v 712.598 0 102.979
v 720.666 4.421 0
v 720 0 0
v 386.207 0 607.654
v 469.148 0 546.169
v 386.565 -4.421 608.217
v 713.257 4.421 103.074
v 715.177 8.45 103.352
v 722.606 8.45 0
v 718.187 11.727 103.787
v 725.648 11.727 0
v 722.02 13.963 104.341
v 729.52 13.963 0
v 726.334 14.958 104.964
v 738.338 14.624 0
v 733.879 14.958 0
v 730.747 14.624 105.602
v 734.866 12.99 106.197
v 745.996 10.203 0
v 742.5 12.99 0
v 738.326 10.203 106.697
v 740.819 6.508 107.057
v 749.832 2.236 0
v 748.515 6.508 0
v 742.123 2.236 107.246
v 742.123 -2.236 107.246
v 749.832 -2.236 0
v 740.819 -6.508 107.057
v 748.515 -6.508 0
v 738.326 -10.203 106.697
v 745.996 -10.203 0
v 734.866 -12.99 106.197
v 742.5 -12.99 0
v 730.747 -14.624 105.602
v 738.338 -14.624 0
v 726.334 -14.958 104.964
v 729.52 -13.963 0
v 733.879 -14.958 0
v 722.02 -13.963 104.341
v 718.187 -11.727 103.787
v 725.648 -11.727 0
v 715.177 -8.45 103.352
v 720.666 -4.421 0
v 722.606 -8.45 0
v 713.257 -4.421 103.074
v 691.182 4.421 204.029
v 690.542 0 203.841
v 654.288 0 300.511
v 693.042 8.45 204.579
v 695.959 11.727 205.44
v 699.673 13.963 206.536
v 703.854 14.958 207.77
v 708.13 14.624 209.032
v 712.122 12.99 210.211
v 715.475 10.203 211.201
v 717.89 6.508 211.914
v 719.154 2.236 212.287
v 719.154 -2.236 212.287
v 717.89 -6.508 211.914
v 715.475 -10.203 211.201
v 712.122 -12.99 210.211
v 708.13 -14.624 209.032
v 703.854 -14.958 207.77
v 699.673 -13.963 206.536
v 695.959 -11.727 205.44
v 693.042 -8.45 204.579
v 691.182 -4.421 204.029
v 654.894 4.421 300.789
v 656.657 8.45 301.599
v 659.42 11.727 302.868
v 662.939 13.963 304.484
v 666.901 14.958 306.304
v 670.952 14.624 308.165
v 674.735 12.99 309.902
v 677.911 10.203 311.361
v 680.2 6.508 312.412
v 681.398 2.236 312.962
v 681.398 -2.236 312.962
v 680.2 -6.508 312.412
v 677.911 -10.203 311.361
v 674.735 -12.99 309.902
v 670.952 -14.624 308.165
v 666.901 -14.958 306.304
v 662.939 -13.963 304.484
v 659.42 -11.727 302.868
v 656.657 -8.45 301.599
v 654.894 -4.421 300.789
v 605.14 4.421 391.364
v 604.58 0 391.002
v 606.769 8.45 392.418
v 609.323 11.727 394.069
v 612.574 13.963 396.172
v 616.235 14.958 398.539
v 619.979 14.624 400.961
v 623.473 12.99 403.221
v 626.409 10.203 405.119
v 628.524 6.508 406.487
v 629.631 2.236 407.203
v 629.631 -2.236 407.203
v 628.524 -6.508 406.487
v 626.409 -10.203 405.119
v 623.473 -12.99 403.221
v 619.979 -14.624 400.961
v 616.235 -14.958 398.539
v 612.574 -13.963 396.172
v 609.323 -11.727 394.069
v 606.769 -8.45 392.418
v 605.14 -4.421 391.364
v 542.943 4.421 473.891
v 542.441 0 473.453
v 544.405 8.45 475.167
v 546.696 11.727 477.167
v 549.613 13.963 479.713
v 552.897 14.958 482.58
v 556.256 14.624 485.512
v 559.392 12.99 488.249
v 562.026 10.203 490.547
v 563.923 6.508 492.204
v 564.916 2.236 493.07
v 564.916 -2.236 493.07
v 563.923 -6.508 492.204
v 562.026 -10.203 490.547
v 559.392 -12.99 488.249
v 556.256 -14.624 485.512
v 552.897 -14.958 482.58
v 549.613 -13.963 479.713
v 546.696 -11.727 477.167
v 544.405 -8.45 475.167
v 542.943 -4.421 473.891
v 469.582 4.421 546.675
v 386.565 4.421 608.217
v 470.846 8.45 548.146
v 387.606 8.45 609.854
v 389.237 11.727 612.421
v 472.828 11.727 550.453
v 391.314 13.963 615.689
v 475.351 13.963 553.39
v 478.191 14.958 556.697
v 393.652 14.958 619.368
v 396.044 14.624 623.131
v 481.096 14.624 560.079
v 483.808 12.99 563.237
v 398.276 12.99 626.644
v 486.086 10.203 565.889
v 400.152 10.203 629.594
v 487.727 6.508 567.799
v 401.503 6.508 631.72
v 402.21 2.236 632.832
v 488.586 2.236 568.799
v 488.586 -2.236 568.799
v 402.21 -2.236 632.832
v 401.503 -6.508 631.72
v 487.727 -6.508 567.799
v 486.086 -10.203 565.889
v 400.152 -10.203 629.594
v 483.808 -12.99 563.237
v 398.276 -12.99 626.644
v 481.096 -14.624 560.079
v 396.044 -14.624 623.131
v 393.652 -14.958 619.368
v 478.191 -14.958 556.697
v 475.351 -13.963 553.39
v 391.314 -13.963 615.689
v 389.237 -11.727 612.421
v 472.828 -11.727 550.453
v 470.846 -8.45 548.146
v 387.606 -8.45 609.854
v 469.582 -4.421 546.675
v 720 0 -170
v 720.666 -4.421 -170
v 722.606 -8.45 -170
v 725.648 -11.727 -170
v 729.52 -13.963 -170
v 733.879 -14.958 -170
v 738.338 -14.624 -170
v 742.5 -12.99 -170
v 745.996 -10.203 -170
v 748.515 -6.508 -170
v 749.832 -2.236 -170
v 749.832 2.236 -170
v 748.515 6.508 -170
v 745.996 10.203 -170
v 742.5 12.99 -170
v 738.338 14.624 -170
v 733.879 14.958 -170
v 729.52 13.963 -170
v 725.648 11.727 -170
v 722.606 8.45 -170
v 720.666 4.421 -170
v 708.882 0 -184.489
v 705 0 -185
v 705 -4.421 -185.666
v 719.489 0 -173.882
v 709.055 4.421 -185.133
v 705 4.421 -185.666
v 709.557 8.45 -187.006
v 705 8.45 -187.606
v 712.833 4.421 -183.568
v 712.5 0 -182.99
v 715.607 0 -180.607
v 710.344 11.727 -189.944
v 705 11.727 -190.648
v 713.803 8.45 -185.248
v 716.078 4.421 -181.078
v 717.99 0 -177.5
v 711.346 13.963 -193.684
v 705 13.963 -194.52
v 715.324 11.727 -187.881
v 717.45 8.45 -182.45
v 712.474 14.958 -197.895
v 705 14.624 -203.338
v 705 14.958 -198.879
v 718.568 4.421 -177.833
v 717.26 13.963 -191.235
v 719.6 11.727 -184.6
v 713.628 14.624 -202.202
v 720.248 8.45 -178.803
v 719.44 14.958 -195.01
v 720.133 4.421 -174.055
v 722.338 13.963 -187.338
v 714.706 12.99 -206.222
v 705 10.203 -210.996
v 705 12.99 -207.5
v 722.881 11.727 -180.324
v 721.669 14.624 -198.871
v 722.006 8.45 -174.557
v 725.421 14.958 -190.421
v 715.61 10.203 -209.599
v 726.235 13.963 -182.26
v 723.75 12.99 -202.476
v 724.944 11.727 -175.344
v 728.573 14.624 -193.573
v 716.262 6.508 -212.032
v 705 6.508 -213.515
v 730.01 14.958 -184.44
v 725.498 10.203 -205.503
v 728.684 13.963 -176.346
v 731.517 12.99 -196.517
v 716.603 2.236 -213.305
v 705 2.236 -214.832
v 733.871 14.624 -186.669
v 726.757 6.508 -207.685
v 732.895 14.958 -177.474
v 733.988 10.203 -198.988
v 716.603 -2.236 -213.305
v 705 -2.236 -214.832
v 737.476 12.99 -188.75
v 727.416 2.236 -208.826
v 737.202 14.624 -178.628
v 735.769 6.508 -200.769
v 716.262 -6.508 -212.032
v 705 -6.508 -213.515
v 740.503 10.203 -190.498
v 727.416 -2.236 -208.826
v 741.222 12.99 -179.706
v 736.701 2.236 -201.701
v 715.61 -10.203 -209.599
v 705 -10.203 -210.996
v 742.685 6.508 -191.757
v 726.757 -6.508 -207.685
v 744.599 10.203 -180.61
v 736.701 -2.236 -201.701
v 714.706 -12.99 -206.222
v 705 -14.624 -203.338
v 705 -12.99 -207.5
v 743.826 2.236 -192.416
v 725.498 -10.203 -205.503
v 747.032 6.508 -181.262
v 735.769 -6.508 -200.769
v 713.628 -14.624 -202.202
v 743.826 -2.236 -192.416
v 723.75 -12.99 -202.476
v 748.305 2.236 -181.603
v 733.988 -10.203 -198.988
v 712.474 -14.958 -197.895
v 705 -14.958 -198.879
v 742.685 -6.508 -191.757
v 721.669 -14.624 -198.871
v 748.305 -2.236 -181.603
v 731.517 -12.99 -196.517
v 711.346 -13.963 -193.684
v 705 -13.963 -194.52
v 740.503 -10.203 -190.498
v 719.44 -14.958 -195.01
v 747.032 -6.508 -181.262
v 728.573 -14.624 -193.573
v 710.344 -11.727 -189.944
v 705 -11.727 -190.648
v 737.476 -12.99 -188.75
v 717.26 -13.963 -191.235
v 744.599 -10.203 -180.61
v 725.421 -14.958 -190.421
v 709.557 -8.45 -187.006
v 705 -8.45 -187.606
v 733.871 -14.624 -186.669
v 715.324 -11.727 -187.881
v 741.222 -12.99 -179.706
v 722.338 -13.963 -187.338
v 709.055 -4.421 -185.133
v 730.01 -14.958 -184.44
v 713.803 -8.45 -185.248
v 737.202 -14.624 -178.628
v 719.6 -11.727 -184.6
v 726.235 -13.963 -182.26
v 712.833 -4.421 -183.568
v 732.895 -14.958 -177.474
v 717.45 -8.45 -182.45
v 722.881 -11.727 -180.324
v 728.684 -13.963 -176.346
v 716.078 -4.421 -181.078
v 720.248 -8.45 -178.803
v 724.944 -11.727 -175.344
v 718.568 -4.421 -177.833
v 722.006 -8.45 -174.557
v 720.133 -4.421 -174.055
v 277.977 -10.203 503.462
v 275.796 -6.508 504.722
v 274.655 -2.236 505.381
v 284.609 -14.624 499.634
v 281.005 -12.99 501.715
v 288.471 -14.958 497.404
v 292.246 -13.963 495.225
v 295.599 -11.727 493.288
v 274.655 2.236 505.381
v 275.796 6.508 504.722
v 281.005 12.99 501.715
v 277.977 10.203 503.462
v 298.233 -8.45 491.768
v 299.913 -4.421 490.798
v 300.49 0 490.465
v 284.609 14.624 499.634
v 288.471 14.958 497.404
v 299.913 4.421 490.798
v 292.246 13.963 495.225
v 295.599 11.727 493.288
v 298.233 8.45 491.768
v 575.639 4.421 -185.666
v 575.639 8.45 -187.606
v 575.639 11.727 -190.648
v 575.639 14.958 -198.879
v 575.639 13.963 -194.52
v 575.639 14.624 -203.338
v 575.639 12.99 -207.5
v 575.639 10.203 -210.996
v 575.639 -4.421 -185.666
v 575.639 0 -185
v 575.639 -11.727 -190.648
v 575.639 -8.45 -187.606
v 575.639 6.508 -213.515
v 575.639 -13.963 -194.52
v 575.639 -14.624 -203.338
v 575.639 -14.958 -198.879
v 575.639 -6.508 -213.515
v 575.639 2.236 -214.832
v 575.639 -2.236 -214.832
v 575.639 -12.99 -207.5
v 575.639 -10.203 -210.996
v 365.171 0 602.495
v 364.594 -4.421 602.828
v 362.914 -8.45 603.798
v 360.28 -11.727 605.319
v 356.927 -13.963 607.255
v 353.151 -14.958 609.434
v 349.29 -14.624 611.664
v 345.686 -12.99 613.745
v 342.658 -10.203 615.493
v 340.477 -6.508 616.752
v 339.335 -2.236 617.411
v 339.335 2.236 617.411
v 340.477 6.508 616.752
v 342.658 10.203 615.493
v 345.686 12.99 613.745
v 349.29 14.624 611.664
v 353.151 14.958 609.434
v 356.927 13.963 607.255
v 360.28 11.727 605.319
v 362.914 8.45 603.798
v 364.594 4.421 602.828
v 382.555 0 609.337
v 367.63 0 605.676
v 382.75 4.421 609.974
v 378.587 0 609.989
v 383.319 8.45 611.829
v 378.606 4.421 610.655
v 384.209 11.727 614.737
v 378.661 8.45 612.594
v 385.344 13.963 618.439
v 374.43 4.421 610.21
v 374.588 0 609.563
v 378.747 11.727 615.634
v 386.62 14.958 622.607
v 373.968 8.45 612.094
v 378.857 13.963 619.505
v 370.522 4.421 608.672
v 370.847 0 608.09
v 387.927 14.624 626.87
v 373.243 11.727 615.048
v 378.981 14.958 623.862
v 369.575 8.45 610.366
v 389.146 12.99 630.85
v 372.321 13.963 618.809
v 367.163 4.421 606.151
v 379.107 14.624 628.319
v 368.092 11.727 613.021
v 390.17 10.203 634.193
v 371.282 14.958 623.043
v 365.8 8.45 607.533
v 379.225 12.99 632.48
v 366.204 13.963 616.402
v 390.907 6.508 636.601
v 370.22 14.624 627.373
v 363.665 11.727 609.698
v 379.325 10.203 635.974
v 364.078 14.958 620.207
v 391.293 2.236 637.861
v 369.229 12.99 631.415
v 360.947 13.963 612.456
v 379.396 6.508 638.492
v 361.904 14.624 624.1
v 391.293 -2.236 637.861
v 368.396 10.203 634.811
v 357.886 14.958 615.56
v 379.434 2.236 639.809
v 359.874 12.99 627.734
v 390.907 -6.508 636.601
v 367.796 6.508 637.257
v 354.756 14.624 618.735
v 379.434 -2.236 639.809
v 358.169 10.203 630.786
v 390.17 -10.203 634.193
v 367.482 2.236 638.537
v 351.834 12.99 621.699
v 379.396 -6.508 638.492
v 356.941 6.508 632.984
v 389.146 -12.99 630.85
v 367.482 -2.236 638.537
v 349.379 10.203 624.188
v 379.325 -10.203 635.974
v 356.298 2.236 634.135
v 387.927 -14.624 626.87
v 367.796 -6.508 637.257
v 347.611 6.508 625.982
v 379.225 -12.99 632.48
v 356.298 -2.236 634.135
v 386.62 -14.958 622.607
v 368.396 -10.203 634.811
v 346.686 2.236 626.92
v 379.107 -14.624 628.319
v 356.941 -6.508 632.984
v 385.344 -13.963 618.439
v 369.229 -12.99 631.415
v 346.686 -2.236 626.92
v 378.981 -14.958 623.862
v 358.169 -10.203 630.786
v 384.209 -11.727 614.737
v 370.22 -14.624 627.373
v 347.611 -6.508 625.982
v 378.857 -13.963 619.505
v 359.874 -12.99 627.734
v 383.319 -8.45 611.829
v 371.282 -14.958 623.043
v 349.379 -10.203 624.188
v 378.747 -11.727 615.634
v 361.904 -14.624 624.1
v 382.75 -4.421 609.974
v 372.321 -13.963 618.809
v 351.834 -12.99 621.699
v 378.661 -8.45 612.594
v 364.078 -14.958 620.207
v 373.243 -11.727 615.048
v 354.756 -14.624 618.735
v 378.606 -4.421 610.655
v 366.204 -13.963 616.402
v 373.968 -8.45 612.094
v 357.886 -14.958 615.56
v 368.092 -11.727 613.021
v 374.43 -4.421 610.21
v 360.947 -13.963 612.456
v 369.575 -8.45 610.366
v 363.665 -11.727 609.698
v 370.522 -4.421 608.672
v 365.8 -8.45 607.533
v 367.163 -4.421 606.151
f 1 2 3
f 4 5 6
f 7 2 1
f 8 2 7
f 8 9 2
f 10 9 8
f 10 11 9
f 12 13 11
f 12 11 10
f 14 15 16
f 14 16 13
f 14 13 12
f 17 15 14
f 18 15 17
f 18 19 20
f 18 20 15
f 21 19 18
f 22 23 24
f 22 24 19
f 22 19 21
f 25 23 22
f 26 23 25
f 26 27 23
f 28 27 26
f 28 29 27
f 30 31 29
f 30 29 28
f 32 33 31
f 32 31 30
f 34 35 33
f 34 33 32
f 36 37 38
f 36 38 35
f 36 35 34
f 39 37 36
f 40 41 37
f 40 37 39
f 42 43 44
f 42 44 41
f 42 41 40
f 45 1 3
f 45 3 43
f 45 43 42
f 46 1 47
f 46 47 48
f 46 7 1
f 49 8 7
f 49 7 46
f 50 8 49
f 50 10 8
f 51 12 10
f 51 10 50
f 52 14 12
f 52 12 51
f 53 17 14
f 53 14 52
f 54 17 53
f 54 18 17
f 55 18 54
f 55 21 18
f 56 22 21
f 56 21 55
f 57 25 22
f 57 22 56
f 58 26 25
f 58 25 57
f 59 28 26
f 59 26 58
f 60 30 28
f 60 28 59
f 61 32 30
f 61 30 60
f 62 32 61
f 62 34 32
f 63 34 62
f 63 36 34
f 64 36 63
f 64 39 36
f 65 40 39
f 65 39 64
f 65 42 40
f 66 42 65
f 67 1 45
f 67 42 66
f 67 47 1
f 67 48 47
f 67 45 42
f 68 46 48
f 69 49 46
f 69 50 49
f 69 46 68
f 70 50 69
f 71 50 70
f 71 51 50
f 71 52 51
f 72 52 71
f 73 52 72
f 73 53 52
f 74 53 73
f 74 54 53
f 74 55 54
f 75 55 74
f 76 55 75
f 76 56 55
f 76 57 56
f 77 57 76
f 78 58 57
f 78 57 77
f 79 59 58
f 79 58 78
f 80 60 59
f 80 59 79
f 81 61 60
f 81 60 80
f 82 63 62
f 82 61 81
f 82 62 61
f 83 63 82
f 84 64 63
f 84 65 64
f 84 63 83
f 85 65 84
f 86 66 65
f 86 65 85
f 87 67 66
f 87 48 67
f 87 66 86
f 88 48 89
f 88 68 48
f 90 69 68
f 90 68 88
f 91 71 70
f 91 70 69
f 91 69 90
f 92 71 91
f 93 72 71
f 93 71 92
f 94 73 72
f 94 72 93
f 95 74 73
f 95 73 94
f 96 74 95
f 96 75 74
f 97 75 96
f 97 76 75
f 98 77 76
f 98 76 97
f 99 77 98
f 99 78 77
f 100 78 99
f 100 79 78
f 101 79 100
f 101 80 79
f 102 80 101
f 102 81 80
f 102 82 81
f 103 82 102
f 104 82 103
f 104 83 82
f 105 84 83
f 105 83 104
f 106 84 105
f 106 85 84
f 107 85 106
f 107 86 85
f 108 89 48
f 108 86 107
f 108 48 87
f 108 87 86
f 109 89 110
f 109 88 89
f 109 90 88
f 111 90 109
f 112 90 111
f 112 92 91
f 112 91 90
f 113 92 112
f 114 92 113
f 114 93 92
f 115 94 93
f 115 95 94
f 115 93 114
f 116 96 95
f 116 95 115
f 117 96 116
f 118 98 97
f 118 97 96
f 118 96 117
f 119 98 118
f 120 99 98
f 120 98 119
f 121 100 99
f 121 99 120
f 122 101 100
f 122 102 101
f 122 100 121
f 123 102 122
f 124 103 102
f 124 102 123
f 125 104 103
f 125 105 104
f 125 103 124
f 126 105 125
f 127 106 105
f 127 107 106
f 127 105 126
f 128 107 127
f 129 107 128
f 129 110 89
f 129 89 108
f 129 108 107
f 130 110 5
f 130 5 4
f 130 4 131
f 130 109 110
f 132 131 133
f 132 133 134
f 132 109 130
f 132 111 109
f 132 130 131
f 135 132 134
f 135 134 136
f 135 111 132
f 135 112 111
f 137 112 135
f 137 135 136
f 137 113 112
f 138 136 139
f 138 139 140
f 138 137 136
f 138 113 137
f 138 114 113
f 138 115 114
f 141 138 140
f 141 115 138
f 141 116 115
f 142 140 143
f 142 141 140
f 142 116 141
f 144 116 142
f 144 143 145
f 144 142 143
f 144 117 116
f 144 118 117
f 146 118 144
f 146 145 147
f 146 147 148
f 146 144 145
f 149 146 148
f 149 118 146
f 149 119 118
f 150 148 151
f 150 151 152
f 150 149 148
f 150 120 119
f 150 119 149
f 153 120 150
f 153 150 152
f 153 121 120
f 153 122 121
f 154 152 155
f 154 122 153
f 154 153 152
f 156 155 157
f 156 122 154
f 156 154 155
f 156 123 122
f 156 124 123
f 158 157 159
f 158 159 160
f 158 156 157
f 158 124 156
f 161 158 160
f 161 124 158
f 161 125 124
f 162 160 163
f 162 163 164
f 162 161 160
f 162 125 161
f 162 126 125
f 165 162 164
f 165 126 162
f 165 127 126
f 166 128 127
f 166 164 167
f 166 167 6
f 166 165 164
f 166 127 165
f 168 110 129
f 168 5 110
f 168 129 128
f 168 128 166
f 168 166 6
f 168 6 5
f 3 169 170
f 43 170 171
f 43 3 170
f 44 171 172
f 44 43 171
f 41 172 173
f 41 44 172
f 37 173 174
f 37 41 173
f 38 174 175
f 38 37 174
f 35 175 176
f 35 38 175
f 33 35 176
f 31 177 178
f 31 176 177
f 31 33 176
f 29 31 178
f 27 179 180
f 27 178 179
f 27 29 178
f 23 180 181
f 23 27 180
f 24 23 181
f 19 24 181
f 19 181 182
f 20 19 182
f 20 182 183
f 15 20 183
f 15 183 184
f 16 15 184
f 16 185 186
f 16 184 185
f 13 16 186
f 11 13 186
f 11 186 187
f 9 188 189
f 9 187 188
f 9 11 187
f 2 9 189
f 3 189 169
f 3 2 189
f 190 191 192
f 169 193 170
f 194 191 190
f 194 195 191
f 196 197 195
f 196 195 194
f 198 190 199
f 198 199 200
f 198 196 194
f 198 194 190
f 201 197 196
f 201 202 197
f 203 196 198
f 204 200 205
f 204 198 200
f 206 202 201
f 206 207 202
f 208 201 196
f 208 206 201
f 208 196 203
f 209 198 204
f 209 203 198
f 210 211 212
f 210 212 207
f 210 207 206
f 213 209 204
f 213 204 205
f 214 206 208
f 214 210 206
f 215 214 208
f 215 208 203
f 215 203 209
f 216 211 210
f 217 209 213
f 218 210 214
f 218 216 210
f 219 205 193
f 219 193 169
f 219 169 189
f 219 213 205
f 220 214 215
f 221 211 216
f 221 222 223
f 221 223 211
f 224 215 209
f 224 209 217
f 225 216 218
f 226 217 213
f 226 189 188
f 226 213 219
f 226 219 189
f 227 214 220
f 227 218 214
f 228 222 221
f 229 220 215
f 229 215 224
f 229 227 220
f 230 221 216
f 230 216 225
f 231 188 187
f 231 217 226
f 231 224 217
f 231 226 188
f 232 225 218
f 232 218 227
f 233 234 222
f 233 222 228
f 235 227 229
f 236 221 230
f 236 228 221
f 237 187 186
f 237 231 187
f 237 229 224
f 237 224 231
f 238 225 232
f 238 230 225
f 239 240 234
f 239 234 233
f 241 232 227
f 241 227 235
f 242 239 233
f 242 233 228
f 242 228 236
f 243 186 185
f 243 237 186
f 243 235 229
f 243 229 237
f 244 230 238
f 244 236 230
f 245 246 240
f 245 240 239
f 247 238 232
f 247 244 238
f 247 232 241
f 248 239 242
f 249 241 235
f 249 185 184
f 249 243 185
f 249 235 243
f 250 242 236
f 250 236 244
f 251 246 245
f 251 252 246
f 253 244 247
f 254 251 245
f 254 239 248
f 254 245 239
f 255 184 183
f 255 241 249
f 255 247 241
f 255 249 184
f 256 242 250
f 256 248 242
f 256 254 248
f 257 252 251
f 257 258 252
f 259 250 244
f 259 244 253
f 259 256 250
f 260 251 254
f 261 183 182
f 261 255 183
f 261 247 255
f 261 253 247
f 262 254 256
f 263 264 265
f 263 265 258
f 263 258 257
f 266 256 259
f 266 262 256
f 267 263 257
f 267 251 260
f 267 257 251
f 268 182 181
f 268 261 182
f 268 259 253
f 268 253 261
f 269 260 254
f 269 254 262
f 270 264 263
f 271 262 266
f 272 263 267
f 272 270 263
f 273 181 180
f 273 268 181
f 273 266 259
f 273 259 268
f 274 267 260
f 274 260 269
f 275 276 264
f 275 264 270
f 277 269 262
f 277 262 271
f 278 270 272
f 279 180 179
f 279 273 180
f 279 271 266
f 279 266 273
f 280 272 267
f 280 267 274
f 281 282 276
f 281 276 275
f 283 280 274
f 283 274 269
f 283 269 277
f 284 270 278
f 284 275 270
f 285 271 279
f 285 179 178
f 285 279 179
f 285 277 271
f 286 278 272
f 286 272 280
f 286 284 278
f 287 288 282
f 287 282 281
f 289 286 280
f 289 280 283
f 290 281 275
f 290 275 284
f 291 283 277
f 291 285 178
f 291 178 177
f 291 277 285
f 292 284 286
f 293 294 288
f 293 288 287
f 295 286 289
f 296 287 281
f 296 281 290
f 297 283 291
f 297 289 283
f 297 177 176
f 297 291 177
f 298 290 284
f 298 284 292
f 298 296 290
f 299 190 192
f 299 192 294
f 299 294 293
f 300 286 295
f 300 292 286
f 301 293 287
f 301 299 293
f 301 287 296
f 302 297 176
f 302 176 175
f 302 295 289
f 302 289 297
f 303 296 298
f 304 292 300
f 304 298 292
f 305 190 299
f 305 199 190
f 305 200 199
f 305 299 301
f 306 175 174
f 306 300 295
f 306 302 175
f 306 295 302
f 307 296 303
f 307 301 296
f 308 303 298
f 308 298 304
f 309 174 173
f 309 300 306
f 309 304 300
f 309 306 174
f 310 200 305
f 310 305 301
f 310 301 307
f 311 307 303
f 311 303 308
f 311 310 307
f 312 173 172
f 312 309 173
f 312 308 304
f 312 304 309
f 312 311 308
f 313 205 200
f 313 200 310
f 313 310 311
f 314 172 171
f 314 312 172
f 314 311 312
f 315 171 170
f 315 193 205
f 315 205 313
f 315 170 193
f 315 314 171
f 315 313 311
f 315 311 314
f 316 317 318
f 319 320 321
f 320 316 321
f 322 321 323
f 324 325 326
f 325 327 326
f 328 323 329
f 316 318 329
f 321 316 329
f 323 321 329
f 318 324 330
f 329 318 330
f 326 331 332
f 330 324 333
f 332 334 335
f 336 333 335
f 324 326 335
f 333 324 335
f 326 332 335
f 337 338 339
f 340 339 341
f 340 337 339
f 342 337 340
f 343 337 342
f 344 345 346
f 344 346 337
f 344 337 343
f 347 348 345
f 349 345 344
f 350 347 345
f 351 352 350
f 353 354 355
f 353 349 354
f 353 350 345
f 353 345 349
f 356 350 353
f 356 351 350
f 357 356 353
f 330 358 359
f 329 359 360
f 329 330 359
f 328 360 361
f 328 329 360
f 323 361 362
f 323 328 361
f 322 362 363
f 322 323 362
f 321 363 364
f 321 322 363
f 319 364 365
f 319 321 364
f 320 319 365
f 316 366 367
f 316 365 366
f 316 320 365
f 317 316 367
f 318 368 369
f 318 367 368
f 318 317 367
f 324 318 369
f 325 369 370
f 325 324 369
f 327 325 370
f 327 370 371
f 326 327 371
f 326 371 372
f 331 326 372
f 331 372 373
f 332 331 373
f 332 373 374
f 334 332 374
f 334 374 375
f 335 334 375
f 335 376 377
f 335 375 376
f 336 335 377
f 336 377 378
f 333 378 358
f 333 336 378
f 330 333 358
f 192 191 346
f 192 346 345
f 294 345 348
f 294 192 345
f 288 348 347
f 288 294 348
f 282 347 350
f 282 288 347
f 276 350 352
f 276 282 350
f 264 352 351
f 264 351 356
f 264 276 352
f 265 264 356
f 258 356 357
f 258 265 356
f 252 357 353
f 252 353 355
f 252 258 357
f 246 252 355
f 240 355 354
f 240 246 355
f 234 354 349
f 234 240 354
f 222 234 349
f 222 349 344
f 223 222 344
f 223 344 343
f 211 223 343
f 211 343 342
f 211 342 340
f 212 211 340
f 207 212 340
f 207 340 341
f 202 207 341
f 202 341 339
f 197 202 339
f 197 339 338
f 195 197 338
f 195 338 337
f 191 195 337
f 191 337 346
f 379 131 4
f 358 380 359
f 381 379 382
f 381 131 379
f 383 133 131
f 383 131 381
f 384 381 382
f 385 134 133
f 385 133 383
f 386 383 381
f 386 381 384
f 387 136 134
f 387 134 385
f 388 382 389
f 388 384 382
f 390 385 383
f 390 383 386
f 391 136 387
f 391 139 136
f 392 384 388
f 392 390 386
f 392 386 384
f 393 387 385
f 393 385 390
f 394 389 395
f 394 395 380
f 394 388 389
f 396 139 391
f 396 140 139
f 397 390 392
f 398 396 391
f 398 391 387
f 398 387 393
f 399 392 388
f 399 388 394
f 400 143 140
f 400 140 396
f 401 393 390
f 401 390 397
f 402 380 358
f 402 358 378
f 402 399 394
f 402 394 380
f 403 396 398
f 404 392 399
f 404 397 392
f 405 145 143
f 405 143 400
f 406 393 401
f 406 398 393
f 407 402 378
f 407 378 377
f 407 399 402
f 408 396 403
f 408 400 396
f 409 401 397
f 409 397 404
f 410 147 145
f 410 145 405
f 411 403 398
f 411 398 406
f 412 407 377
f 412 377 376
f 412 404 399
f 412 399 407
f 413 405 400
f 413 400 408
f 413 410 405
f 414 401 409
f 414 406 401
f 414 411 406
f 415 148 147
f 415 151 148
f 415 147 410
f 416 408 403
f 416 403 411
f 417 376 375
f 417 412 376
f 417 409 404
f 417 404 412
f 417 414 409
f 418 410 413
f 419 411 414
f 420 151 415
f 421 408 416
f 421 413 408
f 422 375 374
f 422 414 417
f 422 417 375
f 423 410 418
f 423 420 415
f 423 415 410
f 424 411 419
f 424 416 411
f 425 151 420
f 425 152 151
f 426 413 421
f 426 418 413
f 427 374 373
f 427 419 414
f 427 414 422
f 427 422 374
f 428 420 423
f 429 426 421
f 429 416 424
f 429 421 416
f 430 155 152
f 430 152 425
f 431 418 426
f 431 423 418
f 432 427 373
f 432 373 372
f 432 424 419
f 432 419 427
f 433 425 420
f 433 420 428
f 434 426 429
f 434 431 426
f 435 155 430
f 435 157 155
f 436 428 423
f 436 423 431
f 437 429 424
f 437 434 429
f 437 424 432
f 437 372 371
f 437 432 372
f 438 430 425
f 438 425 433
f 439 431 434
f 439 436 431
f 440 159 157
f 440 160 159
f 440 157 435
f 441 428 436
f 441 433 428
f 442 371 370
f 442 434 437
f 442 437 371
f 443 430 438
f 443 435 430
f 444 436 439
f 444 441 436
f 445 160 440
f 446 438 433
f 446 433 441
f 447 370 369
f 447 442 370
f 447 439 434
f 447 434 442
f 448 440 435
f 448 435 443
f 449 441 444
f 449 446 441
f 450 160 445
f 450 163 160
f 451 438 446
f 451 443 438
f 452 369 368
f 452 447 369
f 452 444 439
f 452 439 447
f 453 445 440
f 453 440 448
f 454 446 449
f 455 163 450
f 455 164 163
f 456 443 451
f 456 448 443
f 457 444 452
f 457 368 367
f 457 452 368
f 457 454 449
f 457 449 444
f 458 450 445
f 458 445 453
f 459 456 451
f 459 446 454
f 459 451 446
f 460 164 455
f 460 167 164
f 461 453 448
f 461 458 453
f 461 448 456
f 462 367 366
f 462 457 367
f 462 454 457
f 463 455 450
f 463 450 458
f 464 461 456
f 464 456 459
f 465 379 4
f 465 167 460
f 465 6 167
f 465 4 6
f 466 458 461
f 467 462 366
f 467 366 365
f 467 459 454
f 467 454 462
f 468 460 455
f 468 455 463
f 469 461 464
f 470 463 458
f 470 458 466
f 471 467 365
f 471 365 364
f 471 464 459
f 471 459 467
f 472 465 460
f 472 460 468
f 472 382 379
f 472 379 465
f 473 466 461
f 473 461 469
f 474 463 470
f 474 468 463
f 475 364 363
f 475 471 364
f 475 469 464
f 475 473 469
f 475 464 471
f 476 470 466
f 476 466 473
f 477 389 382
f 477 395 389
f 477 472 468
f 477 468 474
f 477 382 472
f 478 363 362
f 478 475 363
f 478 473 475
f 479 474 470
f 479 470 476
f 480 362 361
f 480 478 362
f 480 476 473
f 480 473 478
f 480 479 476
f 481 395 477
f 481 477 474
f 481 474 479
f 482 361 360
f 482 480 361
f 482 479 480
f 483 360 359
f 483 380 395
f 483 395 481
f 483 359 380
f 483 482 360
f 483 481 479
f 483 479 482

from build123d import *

# Parameters (mm, degrees)
CROSS_SECTION_SKETCH_R = 15


with BuildPart() as part:
    # Bar Sweep: sweep along a path in Overhead Sketch
    with BuildLine(Plane(origin=(0, 0, 0), x_dir=(1, 0, 0), z_dir=(0, 1, 0))) as bar_sweep_path:
        Line((575.638587088, 200), (705, 200))
        ThreePointArc((705, 200), (726.213203436, 191.213203436), (735, 170))
        Line((735, 170), (735, 0))
        ThreePointArc((735, 0), (644.20543415, -353.870539338), (394.253445956, -620.313807965))
        ThreePointArc((394.253445956, -620.313807965), (371.015343762, -624.131330145), (352.180706456, -609.994877028))
        Line((352.180706456, -609.994877028), (287.5, -497.964607176))
    # Cross Section Sketch → Bar Sweep (sweep)
    with BuildSketch(Plane.ZY.offset(-575.638587088)):
        with Locations((-200, 0)):
            Circle(CROSS_SECTION_SKETCH_R)
    sweep(path=bar_sweep_path.line)


solid = part.part
